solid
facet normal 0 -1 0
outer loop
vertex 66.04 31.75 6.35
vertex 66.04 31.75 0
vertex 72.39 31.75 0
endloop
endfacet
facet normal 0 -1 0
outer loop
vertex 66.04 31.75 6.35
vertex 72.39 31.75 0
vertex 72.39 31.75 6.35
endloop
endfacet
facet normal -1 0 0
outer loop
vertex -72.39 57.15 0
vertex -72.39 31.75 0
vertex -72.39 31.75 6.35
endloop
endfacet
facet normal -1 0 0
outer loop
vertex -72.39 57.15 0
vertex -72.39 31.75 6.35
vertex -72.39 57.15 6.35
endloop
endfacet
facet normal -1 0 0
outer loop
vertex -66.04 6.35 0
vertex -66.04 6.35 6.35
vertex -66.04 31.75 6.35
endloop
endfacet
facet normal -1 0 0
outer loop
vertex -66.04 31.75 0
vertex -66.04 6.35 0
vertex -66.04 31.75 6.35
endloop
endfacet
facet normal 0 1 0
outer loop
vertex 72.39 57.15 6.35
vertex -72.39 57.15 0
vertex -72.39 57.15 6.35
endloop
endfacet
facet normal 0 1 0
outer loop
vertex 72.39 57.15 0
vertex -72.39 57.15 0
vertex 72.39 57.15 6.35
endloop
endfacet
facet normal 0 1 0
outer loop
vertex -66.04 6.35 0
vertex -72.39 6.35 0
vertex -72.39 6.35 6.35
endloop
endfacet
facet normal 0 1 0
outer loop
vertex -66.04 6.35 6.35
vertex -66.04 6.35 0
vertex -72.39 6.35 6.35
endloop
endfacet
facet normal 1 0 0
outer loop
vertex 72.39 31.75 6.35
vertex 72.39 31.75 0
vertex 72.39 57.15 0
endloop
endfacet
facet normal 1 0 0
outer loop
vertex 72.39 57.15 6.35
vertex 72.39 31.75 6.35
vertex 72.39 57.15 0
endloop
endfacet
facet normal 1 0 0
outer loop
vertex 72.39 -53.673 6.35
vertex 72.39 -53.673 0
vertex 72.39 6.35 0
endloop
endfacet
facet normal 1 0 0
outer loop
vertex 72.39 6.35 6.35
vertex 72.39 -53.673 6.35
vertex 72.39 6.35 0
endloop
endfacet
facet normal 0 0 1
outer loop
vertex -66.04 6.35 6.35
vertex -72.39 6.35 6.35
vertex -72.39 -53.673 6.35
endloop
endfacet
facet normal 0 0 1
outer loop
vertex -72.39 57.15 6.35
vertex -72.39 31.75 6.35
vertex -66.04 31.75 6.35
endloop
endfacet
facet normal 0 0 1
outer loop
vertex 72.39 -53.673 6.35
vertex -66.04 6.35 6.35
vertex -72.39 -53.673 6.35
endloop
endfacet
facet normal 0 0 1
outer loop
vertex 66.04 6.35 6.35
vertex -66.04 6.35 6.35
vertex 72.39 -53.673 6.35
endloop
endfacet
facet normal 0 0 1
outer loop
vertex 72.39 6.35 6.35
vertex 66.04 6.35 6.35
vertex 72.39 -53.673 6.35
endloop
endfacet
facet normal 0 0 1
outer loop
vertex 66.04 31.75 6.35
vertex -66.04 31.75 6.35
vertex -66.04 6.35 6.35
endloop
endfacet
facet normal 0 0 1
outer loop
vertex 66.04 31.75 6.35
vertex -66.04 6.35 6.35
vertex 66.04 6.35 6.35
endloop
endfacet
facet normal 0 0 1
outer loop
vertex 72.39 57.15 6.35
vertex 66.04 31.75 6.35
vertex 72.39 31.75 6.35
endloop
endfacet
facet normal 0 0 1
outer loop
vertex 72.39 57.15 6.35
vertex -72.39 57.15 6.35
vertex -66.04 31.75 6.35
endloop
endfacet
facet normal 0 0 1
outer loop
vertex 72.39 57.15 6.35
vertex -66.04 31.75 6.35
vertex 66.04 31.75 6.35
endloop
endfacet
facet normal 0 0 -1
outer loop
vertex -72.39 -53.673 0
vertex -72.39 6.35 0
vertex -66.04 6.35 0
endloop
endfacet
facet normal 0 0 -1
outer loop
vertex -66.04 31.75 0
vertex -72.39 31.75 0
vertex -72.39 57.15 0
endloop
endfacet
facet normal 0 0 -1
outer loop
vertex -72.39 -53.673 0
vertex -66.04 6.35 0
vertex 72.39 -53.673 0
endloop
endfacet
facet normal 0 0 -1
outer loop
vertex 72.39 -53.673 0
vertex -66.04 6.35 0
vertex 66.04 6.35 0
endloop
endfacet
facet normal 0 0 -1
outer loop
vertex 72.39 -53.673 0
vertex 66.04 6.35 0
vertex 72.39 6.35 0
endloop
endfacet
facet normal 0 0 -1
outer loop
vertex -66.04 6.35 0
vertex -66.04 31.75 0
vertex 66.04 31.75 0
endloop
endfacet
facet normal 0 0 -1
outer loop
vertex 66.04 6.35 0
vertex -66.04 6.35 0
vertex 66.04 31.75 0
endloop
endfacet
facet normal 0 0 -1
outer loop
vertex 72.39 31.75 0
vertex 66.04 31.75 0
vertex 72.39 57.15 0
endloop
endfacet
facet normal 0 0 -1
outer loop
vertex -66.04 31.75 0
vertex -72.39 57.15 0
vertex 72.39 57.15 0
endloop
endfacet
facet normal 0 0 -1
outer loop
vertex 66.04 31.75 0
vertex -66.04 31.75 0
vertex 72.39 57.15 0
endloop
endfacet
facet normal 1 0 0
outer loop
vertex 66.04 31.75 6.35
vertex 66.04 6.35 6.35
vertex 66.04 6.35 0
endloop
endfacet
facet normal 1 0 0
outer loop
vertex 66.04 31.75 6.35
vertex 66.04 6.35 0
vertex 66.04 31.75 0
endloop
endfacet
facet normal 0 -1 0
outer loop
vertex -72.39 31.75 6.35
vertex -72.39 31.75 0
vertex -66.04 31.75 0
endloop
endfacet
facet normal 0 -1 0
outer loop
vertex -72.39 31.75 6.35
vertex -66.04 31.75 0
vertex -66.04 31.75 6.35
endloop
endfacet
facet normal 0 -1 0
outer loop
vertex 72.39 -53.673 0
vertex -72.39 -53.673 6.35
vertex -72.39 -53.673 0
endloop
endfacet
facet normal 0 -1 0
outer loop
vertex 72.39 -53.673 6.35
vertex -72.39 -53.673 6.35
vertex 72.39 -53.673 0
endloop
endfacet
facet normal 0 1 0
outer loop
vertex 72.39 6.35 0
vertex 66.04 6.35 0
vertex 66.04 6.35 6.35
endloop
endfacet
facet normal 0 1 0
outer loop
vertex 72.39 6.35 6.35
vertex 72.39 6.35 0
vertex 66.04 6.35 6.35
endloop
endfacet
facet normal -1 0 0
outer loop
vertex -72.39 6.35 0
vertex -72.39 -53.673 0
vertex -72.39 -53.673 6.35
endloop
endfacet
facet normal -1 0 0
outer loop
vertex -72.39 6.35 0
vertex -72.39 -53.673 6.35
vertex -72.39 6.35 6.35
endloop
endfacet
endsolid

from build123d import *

# Parameters (mm, degrees)
SKETCH1_W           = 144.78
SKETCH1_H           = 114.3
BOSS_EXTRUDE1_DEPTH = 6.35
CAVITY1_START       = -72.39
CAVITY1_OUTLINE_W   = 25.4
CAVITY1_OUTLINE_H   = 6.35
CAVITY1_DEPTH       = 6.35
CAVITY1_START_2     = 66.04
CAVITY1_2_OUTLINE_W = 25.4
CAVITY1_2_OUTLINE_H = 6.35
CAVITY1_2_DEPTH     = 6.35
SKETCH4_W           = 144.78
SKETCH4_H           = 3.477037696
CUT_EXTRUDE2_DEPTH  = 93.448672787


# Read off the part's stored shape, not the designer's step: Cavity1
with BuildPart() as part:
    # Sketch1 → Boss-Extrude1 (new body)
    with BuildSketch(Plane.XY):
        Rectangle(SKETCH1_W, SKETCH1_H)
    extrude(amount=BOSS_EXTRUDE1_DEPTH)

    # Cavity1 outline → Cavity1 (cut)
    with BuildSketch(Plane.YZ.offset(CAVITY1_START)):
        with Locations((19.05, 3.175)):
            Rectangle(CAVITY1_OUTLINE_W, CAVITY1_OUTLINE_H)
    extrude(amount=CAVITY1_DEPTH, mode=Mode.SUBTRACT)

    # Cavity1 2 outline → Cavity1 2 (cut)
    with BuildSketch(Plane.YZ.offset(CAVITY1_START_2)):
        with Locations((19.05, 3.175)):
            Rectangle(CAVITY1_2_OUTLINE_W, CAVITY1_2_OUTLINE_H)
    extrude(amount=CAVITY1_2_DEPTH, mode=Mode.SUBTRACT)

    # Sketch4 → Cut-Extrude2 (cut, through all)
    with BuildSketch(Plane.XY.offset(6.35)):
        with Locations((0, -55.411481152)):
            Rectangle(SKETCH4_W, SKETCH4_H)
    extrude(amount=-CUT_EXTRUDE2_DEPTH, mode=Mode.SUBTRACT)


solid = part.part
